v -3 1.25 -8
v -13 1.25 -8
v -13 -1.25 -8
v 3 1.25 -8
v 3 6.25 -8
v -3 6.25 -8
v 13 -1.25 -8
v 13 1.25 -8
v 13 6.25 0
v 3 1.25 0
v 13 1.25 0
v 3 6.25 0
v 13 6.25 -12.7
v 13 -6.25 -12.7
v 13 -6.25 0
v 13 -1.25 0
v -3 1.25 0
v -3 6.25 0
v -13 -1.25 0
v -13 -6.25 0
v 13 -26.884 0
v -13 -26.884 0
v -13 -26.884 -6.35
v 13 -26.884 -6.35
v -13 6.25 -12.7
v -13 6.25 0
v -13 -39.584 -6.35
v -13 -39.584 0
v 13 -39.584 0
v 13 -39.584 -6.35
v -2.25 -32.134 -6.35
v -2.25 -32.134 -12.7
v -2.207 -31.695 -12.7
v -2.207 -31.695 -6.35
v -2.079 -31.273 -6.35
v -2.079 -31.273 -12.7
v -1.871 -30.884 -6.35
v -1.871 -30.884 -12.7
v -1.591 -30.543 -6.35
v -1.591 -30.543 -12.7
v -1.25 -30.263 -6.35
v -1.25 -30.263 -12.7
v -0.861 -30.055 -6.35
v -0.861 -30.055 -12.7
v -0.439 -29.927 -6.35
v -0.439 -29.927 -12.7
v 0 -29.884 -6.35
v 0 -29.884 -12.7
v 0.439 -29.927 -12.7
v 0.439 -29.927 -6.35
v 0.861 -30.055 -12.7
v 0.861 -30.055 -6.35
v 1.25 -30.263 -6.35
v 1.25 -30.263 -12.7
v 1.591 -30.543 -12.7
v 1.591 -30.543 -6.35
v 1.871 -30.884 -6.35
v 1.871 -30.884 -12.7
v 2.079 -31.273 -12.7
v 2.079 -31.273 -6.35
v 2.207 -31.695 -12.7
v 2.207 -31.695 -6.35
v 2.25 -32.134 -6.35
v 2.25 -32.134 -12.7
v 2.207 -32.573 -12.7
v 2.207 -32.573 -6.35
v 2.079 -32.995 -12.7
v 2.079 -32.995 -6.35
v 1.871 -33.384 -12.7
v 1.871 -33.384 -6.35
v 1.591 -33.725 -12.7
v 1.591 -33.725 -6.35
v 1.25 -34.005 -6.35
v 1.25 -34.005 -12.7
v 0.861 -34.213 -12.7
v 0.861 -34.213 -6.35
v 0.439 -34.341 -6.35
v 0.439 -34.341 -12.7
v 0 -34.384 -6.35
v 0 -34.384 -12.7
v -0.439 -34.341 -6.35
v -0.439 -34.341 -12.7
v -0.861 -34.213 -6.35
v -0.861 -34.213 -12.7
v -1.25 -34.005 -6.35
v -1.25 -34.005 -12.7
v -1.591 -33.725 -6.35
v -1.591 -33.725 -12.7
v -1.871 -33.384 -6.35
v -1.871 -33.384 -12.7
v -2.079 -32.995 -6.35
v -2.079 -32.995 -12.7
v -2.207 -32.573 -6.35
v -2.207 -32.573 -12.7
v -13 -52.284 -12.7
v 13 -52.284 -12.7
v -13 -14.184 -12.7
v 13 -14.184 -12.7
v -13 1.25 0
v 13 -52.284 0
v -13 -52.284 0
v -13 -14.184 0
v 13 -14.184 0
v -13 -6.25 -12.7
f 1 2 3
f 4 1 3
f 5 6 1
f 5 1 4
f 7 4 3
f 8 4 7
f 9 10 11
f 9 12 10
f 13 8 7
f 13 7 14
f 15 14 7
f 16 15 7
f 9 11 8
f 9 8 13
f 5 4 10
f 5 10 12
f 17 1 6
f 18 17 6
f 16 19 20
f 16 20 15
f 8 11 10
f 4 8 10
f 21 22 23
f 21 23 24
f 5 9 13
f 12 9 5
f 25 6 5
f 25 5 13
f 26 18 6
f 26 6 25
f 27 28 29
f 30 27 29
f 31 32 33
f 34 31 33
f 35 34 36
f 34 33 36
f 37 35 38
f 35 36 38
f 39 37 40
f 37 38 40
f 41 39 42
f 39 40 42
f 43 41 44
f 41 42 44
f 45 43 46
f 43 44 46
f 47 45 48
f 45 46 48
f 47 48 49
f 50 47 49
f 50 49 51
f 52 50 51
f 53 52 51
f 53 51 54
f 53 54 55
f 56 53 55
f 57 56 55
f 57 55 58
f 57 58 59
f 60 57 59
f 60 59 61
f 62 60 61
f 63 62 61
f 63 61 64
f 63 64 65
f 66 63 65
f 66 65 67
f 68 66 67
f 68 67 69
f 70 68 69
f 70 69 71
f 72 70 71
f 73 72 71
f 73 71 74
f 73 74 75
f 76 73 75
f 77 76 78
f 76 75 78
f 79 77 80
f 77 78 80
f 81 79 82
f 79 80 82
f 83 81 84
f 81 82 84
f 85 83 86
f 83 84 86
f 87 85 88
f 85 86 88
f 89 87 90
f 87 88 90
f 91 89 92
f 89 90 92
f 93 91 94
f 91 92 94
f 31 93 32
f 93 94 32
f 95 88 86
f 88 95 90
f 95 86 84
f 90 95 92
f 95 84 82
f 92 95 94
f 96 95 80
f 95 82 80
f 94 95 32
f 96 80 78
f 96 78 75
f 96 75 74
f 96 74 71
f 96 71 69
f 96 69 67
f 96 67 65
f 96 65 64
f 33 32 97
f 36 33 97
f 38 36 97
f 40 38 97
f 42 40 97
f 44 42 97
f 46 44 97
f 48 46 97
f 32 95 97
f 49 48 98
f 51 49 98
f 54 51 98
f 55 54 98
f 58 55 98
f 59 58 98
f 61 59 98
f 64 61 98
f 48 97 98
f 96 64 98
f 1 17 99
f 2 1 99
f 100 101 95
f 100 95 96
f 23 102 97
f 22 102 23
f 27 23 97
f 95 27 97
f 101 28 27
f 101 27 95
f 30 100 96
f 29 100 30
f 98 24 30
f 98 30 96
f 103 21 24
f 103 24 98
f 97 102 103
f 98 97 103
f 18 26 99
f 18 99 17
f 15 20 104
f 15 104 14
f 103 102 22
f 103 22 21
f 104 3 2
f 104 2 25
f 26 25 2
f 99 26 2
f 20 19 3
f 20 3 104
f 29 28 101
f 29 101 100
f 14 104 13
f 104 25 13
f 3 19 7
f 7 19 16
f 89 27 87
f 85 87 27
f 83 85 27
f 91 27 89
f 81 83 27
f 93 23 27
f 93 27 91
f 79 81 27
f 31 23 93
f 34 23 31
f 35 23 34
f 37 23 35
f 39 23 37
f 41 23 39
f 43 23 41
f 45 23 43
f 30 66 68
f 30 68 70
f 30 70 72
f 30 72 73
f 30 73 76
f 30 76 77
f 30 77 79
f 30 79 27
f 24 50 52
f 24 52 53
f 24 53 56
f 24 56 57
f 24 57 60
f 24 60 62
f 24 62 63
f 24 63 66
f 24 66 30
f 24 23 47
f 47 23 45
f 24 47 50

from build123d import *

# Parameters (mm, degrees)
F0_W     = 26
F0_H     = 5
F0_W_2   = 10
F0_W_3   = 6
F1_DEPTH = 12.7
F2_DEPTH = 8
F3_W     = 26
F3_H     = 12.7
F4_DEPTH = 12.7
F5_DEPTH = 6.35
F6_D     = 4.5


# Not quite as in the source:
# - a length typed as a fraction of an inch, garbled in the dataset ("3 / 203.2 mm" for 3/8 in), is restored


with BuildPart() as f1:
    # F0 (on Top) → F1 (new body)
    with BuildSketch(Plane.XY):
        with Locations((0, -3.75)):
            Rectangle(F0_W, F0_H)
        Polygon((-13, -1.25), (13, -1.25), (13, 1.25), (3, 1.25), (-3, 1.25), (-13, 1.25), align=None)
        with Locations((8, 3.75)):
            Rectangle(F0_W_2, F0_H)
        with Locations((-8, 3.75)):
            Rectangle(F0_W_2, F0_H)
        with Locations((0, 3.75)):
            Rectangle(F0_W_3, F0_H)
    extrude(amount=-F1_DEPTH)

    # F0 (on Top) → F2 (cut)
    with BuildSketch(Plane.XY):
        with Locations((0, 3.75)):
            Rectangle(F0_W_3, F0_H)
        Polygon((-13, -1.25), (13, -1.25), (13, 1.25), (3, 1.25), (-3, 1.25), (-13, 1.25), align=None)
    extrude(amount=-F2_DEPTH, mode=Mode.SUBTRACT)


with BuildPart() as f4:
    # F3 (on Top) → F4 (new body)
    with BuildSketch(Plane.XY):
        with Locations((0, -20.533909303)):
            Rectangle(F3_W, F3_H)
        with Locations((0, -33.233909303)):
            Rectangle(F3_W, F3_H)
        with Locations((0, -45.933909303)):
            Rectangle(F3_W, F3_H)
    extrude(amount=-F4_DEPTH)

    # F3 (on Top) → F5 (cut)
    with BuildSketch(Plane.XY):
        with Locations((0, -33.233909303)):
            Rectangle(F3_W, F3_H)
    extrude(amount=-F5_DEPTH, mode=Mode.SUBTRACT)

    # F6 (through all)
    with Locations(Plane.XY):
        with Locations((0, -32.133909303)):
            Hole(F6_D / 2)


solid = Compound([f1.part, f4.part])
